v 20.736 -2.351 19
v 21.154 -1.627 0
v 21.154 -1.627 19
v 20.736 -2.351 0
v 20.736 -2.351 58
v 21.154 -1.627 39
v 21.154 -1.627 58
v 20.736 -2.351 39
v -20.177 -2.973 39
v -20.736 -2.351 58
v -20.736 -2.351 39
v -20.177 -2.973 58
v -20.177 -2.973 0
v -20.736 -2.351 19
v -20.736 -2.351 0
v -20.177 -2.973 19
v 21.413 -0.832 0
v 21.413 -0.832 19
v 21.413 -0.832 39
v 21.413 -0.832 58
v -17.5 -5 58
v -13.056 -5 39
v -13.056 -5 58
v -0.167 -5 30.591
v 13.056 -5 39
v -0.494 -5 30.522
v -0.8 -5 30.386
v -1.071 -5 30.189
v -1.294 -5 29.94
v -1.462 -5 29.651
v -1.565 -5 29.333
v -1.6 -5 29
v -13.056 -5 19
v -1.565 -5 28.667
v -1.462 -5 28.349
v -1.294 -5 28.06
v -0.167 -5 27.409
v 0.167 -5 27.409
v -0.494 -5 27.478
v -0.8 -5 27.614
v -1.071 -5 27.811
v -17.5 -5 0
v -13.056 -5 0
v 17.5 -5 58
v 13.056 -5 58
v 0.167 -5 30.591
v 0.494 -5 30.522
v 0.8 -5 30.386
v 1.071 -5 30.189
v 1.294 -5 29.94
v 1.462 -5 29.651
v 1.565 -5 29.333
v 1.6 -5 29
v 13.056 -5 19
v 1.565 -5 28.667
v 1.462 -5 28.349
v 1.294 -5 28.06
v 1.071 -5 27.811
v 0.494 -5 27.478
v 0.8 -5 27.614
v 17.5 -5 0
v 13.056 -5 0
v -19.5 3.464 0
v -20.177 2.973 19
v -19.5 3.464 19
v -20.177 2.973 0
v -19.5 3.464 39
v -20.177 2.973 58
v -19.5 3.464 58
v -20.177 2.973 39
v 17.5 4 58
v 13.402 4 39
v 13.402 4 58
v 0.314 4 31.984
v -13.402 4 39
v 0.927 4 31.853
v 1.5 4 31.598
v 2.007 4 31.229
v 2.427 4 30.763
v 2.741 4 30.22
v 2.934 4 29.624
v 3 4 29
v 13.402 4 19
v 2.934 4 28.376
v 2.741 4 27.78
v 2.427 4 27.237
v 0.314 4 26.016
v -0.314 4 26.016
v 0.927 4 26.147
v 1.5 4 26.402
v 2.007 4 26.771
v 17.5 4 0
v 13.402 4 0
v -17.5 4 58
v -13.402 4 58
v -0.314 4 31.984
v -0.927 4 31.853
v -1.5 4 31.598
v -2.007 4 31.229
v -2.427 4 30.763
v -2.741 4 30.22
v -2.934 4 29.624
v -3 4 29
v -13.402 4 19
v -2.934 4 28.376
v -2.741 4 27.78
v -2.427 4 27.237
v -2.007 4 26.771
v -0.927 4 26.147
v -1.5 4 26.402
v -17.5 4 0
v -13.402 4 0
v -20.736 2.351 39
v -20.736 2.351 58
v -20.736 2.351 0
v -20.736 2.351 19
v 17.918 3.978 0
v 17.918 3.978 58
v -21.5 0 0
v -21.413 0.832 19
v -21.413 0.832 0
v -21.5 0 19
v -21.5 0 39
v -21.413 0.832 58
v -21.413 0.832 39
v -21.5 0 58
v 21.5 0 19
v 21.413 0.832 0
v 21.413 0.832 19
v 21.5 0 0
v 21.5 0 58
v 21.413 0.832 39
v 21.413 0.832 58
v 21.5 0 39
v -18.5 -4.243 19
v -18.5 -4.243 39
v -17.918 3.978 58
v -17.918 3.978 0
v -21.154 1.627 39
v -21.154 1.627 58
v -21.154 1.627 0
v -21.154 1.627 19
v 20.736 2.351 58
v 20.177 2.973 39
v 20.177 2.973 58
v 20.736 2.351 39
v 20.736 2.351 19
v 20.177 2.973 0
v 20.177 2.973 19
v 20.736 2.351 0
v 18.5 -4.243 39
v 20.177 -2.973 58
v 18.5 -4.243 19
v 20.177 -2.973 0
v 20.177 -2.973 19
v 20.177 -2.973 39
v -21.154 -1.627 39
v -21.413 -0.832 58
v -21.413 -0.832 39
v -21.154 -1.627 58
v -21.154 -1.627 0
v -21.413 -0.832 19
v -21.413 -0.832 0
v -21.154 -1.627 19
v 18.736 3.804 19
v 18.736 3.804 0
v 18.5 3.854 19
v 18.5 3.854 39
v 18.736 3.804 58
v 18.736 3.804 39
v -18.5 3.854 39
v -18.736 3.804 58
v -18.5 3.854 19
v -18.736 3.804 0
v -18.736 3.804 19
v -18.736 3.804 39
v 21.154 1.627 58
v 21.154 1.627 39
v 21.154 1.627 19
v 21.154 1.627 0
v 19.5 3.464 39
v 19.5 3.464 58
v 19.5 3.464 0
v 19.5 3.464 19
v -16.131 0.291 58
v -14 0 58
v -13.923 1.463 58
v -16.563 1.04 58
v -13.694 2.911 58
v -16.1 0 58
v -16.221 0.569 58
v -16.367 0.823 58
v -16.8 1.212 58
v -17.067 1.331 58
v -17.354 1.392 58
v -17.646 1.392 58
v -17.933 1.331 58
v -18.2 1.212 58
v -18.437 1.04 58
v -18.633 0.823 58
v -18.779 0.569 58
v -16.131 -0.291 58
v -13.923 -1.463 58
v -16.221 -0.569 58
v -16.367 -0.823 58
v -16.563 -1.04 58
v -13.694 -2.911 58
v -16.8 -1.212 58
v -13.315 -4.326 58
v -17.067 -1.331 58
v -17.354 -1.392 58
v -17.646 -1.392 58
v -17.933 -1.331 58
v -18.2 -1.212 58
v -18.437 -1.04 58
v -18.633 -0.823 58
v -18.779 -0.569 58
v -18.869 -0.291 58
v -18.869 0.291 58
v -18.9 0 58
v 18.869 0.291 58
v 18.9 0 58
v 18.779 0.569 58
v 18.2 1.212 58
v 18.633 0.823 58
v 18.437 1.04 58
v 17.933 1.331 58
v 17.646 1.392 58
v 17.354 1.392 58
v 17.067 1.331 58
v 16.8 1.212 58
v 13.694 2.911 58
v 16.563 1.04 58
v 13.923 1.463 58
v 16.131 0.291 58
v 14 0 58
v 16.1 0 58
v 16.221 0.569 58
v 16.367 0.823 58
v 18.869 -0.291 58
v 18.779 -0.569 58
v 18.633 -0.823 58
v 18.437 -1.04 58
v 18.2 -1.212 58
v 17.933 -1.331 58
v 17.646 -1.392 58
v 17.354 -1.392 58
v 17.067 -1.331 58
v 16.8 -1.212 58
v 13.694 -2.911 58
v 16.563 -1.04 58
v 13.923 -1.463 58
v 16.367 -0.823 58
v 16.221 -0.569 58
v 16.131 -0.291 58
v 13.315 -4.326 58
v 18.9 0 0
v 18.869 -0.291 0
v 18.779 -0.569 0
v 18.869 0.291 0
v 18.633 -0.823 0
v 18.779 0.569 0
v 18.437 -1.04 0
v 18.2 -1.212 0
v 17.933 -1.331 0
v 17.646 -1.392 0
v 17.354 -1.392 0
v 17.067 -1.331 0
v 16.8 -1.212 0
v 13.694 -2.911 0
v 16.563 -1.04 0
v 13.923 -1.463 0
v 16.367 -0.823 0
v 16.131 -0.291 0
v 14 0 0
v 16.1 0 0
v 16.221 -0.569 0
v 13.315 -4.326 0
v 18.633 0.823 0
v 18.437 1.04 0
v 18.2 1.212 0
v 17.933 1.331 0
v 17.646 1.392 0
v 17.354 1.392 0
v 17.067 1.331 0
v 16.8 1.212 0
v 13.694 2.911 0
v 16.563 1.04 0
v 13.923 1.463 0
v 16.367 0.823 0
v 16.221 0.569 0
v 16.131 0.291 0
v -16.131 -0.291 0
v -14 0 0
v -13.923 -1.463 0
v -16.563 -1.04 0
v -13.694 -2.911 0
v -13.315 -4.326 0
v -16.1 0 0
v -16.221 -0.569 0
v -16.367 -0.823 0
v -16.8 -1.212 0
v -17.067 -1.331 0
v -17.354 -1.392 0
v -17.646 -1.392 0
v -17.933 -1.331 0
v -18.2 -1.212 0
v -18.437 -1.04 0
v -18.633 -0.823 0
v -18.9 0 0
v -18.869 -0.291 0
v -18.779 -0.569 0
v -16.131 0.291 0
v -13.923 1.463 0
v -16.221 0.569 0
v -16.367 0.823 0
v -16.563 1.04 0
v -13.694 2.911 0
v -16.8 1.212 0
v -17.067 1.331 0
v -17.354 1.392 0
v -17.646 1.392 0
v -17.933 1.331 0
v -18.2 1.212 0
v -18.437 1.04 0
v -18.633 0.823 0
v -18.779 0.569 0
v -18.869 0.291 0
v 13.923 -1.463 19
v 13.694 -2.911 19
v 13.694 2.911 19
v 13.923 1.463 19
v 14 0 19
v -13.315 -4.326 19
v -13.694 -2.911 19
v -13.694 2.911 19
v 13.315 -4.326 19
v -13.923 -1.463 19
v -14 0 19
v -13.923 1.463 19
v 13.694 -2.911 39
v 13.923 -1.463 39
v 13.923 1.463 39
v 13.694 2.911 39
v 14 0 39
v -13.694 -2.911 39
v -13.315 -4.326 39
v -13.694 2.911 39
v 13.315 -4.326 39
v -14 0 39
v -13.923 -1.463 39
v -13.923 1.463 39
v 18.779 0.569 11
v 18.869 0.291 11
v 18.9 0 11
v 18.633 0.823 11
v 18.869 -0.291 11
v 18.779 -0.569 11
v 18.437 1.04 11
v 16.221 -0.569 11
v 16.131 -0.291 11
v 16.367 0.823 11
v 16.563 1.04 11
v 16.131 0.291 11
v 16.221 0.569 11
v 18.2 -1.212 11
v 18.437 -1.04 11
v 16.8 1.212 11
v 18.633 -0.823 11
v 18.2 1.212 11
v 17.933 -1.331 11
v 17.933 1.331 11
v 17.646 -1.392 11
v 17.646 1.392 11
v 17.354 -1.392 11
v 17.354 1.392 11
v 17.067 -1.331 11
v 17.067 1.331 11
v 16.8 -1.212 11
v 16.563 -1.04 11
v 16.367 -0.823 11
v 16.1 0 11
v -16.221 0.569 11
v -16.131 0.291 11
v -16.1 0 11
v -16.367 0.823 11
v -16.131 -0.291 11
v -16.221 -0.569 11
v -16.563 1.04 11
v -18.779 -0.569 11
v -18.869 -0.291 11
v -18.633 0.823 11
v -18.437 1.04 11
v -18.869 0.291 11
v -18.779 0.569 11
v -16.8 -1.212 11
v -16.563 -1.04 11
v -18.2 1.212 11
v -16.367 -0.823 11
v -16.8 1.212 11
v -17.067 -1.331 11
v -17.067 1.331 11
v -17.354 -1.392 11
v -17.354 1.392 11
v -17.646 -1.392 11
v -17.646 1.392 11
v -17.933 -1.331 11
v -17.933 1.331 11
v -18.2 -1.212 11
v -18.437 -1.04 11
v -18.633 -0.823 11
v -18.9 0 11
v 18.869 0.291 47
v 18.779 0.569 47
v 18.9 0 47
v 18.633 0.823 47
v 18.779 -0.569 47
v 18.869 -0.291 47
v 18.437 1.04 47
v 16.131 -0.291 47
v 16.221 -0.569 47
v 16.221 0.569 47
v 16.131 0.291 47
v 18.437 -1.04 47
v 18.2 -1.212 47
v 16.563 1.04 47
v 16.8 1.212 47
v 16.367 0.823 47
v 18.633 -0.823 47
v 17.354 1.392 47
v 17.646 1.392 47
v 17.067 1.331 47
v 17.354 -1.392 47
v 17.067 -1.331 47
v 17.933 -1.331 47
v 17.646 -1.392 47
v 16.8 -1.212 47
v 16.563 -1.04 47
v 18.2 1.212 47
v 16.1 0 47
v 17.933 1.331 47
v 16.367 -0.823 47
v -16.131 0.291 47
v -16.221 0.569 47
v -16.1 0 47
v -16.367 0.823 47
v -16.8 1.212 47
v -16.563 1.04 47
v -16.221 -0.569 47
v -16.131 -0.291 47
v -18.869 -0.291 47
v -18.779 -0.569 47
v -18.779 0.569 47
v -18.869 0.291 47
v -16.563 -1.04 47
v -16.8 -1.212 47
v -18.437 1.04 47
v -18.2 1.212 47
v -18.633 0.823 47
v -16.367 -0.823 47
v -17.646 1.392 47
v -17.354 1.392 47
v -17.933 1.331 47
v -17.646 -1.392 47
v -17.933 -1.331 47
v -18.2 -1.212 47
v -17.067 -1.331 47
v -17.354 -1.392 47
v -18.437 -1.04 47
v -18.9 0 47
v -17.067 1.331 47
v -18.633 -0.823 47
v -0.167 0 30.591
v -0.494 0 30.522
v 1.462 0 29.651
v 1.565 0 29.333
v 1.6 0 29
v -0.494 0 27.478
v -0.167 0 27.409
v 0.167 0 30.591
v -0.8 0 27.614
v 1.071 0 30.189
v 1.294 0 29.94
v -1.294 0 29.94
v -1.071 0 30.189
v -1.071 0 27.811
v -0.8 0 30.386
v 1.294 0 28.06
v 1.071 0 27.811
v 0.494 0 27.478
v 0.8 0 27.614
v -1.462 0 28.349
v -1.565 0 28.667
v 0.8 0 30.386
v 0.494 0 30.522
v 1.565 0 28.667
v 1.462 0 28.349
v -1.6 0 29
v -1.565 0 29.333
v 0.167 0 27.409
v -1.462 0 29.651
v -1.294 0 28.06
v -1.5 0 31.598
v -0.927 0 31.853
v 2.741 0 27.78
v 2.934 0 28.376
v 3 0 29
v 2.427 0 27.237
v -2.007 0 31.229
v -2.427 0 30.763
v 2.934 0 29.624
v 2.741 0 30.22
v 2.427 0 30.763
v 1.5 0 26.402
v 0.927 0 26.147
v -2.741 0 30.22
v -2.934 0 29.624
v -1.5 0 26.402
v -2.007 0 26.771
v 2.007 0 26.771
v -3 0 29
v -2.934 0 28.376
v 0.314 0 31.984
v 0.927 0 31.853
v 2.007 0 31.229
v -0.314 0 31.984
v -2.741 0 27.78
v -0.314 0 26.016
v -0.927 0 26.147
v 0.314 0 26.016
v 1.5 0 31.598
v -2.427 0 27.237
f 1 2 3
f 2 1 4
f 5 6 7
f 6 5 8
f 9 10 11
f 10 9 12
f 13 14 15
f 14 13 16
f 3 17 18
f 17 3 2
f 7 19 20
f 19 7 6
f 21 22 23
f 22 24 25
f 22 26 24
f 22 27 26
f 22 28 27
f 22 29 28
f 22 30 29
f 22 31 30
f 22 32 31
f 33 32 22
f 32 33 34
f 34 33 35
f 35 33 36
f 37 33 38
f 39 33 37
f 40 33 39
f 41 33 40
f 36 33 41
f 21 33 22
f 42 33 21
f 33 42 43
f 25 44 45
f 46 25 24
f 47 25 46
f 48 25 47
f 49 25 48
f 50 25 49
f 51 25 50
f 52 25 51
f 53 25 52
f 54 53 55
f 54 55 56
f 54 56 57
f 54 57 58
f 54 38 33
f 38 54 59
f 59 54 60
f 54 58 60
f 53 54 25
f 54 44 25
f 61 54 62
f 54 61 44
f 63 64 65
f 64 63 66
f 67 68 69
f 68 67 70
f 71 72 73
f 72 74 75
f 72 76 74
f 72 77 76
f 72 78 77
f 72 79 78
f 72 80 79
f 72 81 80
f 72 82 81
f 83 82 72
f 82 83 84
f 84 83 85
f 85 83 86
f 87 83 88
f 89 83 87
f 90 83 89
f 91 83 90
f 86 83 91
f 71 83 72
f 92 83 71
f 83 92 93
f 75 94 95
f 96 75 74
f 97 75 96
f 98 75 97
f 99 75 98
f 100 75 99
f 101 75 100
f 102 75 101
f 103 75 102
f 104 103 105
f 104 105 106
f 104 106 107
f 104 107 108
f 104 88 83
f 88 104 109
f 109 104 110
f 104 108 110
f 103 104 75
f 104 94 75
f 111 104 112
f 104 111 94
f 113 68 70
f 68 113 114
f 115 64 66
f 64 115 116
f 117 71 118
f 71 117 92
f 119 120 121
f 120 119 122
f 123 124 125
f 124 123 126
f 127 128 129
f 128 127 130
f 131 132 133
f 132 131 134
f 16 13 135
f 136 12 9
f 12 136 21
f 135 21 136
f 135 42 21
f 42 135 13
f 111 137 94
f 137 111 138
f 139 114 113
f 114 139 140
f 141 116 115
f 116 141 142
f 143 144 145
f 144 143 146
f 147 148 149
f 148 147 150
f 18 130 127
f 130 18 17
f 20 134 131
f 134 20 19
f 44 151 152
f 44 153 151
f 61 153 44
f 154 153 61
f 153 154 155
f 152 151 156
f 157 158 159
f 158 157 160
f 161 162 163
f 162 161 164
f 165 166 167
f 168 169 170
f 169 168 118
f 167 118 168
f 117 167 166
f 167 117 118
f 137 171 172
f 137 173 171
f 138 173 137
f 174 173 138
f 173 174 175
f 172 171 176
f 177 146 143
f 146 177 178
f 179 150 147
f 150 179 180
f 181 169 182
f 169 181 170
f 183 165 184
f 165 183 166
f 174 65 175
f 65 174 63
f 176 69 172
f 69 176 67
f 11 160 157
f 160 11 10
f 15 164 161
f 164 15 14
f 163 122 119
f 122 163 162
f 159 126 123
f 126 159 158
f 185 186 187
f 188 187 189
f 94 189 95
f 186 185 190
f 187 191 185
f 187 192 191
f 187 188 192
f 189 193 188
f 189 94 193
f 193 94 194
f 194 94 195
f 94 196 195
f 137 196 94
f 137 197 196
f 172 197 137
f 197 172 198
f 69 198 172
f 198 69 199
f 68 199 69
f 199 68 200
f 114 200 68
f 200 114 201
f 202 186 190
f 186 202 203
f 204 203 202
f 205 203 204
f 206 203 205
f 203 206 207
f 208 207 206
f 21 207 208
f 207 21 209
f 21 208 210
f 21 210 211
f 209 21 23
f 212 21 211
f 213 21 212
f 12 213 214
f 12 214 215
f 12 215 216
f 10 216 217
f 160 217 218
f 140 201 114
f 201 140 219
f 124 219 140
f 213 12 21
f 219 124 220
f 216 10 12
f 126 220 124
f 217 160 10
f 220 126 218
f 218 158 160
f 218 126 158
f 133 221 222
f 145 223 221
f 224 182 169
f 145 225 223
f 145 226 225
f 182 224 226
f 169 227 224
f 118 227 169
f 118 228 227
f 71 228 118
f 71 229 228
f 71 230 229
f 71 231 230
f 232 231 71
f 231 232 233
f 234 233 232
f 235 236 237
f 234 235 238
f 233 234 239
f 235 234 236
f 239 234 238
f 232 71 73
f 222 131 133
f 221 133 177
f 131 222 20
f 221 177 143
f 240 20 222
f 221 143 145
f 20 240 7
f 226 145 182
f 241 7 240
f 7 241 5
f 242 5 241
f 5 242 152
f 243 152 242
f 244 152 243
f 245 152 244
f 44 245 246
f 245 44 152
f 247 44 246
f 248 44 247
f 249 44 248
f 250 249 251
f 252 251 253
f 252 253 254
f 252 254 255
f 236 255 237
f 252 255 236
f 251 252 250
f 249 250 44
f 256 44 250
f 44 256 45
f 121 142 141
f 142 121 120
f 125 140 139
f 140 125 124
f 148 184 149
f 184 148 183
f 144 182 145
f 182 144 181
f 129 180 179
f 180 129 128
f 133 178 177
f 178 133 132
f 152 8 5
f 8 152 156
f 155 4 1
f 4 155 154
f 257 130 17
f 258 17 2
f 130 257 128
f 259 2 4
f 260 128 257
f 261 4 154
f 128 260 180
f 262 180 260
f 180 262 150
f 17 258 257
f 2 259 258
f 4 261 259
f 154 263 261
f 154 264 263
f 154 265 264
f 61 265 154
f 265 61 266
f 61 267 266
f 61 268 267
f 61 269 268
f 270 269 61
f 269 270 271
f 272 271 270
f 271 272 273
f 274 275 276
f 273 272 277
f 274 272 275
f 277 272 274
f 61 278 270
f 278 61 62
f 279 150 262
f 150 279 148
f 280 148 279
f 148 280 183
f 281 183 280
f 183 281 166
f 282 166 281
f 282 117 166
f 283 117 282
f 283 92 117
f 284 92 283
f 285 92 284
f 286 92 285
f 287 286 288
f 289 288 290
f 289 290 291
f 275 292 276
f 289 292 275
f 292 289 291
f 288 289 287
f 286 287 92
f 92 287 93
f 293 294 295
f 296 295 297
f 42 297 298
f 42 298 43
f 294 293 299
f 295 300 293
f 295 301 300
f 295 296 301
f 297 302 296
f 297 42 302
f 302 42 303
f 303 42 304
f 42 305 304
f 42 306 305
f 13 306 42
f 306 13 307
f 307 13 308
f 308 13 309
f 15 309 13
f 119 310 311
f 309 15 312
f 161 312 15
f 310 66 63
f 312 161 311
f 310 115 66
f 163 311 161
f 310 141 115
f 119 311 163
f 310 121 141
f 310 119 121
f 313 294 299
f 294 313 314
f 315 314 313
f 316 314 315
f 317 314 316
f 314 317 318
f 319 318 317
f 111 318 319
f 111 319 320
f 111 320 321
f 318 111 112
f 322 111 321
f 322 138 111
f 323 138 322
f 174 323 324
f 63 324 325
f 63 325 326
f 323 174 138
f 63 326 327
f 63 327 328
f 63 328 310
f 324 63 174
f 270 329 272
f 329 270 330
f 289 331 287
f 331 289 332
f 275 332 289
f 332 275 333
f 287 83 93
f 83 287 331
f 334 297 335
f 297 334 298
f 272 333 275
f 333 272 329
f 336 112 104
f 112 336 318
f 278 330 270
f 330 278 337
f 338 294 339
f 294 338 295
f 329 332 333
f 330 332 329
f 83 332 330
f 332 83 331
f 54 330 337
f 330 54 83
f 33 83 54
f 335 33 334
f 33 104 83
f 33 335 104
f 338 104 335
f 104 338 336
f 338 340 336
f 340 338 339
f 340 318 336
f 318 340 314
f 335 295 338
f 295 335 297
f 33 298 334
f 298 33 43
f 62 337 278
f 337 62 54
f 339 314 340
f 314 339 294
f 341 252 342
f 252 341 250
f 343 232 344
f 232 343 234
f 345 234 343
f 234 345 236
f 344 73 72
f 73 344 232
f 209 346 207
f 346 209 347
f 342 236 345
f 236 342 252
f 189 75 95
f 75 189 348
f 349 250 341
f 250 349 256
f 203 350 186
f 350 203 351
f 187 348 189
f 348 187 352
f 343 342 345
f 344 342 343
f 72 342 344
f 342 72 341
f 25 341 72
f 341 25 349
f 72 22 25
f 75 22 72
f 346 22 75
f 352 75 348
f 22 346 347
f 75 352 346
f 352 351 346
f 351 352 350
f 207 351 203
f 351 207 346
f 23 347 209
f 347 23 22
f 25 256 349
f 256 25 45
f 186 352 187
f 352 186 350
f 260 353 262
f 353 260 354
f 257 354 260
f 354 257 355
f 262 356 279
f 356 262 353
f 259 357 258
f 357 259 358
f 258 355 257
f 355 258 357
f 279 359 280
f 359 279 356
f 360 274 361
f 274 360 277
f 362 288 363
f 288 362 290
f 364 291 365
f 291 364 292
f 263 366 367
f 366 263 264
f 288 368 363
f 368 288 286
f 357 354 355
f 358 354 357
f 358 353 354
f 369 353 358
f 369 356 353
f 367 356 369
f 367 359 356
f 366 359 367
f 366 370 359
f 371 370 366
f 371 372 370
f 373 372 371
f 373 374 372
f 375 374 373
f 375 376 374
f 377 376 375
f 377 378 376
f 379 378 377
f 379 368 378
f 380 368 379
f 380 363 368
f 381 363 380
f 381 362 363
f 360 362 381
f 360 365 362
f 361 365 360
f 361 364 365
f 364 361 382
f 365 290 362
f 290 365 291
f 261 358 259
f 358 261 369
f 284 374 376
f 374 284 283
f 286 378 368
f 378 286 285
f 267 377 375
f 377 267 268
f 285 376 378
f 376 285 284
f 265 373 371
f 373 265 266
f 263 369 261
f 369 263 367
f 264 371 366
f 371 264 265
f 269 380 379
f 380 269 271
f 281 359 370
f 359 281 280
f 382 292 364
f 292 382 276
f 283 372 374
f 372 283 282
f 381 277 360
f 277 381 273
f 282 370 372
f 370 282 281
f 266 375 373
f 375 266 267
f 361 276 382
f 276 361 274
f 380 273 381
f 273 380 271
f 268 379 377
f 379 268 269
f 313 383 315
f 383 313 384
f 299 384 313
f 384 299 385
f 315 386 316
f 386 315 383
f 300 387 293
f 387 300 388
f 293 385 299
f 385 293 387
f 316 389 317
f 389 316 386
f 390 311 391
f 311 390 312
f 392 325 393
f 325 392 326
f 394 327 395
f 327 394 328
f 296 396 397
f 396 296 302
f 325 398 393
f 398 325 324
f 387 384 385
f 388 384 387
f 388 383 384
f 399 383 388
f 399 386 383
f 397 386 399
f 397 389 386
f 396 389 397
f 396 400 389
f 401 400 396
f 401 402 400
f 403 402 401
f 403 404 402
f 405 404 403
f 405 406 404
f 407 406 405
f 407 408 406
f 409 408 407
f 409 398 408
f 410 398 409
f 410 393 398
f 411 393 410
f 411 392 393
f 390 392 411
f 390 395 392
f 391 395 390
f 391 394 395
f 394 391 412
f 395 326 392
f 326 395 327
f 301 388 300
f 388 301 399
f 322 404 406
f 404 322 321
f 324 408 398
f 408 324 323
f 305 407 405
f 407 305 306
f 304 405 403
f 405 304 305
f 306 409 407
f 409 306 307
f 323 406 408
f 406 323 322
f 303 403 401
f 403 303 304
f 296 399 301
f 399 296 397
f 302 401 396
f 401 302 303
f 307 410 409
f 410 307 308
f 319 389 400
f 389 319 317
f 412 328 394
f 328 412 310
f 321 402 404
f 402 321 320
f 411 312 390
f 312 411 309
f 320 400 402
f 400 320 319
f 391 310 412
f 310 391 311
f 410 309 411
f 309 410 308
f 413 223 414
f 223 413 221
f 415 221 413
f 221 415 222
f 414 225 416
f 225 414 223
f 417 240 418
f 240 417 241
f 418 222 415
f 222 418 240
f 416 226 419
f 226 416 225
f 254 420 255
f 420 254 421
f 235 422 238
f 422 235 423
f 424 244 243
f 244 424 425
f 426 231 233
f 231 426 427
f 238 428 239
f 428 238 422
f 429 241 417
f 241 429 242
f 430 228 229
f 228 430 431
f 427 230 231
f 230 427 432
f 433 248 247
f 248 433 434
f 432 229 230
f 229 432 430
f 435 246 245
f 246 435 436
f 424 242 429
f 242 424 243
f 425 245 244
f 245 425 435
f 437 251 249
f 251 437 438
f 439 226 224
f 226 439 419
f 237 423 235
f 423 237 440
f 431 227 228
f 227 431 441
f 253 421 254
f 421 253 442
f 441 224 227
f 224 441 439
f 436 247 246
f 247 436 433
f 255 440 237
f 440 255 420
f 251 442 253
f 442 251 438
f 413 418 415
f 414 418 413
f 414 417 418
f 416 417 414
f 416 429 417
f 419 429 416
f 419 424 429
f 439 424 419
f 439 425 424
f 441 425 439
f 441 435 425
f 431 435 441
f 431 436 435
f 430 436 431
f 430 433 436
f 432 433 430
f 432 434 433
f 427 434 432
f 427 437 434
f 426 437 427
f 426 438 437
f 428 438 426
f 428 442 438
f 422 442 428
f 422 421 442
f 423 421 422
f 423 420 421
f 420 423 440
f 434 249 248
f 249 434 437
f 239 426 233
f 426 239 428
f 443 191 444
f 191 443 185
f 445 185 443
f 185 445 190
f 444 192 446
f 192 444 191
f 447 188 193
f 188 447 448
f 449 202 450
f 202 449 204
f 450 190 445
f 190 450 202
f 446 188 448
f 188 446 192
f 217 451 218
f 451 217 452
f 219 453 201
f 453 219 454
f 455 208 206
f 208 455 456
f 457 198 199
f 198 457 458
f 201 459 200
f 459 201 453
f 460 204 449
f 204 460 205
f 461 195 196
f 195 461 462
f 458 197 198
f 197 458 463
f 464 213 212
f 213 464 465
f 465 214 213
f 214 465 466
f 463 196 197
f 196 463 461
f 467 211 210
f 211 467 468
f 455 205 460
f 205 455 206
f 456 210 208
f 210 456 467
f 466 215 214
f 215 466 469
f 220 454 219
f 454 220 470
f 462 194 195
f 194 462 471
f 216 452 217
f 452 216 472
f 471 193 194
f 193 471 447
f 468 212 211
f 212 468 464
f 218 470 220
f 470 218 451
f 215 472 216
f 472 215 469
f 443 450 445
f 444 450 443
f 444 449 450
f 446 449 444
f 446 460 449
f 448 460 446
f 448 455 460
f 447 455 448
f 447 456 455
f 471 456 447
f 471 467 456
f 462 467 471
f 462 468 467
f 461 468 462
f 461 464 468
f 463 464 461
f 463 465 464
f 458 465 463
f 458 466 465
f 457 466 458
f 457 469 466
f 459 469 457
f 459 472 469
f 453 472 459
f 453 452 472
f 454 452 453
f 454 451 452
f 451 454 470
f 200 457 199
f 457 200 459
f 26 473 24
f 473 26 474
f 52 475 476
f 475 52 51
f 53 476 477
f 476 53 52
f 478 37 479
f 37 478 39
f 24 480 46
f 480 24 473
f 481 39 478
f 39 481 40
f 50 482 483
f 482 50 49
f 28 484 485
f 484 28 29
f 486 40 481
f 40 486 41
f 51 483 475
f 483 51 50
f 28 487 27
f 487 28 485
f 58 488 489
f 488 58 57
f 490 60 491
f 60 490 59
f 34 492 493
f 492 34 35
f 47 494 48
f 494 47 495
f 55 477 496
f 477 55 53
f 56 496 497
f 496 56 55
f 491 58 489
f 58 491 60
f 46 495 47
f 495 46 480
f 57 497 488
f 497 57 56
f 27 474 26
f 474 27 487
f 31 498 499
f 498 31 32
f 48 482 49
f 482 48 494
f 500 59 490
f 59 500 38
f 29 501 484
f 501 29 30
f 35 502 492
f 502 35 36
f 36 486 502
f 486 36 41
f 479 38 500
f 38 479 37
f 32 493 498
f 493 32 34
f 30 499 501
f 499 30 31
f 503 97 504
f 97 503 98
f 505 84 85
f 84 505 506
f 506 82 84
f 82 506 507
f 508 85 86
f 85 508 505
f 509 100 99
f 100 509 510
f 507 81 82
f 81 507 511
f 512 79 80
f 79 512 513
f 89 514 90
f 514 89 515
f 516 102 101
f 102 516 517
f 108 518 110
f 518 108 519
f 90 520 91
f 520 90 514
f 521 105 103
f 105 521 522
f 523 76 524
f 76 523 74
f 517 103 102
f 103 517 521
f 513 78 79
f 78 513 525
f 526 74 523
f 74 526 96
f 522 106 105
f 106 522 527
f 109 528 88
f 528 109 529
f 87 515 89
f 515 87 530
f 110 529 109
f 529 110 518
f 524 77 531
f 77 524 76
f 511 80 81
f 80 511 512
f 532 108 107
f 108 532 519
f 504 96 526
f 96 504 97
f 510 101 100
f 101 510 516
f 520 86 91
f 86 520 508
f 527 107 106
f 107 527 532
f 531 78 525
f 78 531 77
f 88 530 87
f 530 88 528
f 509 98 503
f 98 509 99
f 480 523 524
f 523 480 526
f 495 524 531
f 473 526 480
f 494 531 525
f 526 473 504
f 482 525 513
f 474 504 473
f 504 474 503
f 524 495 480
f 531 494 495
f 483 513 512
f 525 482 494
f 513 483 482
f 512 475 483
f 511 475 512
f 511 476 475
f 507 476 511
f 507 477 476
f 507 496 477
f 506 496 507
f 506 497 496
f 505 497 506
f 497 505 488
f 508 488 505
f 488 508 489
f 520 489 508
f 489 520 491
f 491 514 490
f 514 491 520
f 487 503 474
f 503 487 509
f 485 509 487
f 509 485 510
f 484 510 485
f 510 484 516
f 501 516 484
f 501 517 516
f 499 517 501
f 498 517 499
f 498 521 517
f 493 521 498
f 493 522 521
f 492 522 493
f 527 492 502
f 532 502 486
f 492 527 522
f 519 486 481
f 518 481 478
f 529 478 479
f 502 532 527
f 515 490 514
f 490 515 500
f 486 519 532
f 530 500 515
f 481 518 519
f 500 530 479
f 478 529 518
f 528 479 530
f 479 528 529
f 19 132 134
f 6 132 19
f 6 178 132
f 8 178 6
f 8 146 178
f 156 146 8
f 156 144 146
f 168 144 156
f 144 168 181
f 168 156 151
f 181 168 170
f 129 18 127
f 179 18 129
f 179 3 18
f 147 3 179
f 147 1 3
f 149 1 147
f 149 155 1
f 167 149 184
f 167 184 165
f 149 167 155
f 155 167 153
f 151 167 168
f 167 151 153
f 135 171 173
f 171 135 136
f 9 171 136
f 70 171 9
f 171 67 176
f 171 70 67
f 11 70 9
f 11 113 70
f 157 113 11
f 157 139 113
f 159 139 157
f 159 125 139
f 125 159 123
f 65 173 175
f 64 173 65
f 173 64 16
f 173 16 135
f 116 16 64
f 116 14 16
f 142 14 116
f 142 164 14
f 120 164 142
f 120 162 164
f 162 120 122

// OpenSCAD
$fn=30;
difference(){
hull(){
translate([17.5,0,0])cylinder(d=8,h=58);
translate([-17.5,0,0])cylinder(d=8,h=58);
translate([-17.5,-5,0])cube([35,9,58]);    
}
cylinder(d=28,h=19,$fn=60);
translate([0,0,39])cylinder(d=28,h=19,$fn=60);
translate([17.5,0,0])cylinder(d=2.8,h=11);
translate([-17.5,0,0])cylinder(d=2.8,h=11);
translate([17.5,0,47])cylinder(d=2.8,h=11);
translate([-17.5,0,47])cylinder(d=2.8,h=11);
translate([0,11,29])rotate([90,0,0])
cylinder(d=3.2,h=22);
translate([0,0,29])rotate([-90,0,0])
cylinder(d=6,h=10);
translate([18.5,-10,19])cube(20);
translate([-38.5,-10,19])cube(20);
}
